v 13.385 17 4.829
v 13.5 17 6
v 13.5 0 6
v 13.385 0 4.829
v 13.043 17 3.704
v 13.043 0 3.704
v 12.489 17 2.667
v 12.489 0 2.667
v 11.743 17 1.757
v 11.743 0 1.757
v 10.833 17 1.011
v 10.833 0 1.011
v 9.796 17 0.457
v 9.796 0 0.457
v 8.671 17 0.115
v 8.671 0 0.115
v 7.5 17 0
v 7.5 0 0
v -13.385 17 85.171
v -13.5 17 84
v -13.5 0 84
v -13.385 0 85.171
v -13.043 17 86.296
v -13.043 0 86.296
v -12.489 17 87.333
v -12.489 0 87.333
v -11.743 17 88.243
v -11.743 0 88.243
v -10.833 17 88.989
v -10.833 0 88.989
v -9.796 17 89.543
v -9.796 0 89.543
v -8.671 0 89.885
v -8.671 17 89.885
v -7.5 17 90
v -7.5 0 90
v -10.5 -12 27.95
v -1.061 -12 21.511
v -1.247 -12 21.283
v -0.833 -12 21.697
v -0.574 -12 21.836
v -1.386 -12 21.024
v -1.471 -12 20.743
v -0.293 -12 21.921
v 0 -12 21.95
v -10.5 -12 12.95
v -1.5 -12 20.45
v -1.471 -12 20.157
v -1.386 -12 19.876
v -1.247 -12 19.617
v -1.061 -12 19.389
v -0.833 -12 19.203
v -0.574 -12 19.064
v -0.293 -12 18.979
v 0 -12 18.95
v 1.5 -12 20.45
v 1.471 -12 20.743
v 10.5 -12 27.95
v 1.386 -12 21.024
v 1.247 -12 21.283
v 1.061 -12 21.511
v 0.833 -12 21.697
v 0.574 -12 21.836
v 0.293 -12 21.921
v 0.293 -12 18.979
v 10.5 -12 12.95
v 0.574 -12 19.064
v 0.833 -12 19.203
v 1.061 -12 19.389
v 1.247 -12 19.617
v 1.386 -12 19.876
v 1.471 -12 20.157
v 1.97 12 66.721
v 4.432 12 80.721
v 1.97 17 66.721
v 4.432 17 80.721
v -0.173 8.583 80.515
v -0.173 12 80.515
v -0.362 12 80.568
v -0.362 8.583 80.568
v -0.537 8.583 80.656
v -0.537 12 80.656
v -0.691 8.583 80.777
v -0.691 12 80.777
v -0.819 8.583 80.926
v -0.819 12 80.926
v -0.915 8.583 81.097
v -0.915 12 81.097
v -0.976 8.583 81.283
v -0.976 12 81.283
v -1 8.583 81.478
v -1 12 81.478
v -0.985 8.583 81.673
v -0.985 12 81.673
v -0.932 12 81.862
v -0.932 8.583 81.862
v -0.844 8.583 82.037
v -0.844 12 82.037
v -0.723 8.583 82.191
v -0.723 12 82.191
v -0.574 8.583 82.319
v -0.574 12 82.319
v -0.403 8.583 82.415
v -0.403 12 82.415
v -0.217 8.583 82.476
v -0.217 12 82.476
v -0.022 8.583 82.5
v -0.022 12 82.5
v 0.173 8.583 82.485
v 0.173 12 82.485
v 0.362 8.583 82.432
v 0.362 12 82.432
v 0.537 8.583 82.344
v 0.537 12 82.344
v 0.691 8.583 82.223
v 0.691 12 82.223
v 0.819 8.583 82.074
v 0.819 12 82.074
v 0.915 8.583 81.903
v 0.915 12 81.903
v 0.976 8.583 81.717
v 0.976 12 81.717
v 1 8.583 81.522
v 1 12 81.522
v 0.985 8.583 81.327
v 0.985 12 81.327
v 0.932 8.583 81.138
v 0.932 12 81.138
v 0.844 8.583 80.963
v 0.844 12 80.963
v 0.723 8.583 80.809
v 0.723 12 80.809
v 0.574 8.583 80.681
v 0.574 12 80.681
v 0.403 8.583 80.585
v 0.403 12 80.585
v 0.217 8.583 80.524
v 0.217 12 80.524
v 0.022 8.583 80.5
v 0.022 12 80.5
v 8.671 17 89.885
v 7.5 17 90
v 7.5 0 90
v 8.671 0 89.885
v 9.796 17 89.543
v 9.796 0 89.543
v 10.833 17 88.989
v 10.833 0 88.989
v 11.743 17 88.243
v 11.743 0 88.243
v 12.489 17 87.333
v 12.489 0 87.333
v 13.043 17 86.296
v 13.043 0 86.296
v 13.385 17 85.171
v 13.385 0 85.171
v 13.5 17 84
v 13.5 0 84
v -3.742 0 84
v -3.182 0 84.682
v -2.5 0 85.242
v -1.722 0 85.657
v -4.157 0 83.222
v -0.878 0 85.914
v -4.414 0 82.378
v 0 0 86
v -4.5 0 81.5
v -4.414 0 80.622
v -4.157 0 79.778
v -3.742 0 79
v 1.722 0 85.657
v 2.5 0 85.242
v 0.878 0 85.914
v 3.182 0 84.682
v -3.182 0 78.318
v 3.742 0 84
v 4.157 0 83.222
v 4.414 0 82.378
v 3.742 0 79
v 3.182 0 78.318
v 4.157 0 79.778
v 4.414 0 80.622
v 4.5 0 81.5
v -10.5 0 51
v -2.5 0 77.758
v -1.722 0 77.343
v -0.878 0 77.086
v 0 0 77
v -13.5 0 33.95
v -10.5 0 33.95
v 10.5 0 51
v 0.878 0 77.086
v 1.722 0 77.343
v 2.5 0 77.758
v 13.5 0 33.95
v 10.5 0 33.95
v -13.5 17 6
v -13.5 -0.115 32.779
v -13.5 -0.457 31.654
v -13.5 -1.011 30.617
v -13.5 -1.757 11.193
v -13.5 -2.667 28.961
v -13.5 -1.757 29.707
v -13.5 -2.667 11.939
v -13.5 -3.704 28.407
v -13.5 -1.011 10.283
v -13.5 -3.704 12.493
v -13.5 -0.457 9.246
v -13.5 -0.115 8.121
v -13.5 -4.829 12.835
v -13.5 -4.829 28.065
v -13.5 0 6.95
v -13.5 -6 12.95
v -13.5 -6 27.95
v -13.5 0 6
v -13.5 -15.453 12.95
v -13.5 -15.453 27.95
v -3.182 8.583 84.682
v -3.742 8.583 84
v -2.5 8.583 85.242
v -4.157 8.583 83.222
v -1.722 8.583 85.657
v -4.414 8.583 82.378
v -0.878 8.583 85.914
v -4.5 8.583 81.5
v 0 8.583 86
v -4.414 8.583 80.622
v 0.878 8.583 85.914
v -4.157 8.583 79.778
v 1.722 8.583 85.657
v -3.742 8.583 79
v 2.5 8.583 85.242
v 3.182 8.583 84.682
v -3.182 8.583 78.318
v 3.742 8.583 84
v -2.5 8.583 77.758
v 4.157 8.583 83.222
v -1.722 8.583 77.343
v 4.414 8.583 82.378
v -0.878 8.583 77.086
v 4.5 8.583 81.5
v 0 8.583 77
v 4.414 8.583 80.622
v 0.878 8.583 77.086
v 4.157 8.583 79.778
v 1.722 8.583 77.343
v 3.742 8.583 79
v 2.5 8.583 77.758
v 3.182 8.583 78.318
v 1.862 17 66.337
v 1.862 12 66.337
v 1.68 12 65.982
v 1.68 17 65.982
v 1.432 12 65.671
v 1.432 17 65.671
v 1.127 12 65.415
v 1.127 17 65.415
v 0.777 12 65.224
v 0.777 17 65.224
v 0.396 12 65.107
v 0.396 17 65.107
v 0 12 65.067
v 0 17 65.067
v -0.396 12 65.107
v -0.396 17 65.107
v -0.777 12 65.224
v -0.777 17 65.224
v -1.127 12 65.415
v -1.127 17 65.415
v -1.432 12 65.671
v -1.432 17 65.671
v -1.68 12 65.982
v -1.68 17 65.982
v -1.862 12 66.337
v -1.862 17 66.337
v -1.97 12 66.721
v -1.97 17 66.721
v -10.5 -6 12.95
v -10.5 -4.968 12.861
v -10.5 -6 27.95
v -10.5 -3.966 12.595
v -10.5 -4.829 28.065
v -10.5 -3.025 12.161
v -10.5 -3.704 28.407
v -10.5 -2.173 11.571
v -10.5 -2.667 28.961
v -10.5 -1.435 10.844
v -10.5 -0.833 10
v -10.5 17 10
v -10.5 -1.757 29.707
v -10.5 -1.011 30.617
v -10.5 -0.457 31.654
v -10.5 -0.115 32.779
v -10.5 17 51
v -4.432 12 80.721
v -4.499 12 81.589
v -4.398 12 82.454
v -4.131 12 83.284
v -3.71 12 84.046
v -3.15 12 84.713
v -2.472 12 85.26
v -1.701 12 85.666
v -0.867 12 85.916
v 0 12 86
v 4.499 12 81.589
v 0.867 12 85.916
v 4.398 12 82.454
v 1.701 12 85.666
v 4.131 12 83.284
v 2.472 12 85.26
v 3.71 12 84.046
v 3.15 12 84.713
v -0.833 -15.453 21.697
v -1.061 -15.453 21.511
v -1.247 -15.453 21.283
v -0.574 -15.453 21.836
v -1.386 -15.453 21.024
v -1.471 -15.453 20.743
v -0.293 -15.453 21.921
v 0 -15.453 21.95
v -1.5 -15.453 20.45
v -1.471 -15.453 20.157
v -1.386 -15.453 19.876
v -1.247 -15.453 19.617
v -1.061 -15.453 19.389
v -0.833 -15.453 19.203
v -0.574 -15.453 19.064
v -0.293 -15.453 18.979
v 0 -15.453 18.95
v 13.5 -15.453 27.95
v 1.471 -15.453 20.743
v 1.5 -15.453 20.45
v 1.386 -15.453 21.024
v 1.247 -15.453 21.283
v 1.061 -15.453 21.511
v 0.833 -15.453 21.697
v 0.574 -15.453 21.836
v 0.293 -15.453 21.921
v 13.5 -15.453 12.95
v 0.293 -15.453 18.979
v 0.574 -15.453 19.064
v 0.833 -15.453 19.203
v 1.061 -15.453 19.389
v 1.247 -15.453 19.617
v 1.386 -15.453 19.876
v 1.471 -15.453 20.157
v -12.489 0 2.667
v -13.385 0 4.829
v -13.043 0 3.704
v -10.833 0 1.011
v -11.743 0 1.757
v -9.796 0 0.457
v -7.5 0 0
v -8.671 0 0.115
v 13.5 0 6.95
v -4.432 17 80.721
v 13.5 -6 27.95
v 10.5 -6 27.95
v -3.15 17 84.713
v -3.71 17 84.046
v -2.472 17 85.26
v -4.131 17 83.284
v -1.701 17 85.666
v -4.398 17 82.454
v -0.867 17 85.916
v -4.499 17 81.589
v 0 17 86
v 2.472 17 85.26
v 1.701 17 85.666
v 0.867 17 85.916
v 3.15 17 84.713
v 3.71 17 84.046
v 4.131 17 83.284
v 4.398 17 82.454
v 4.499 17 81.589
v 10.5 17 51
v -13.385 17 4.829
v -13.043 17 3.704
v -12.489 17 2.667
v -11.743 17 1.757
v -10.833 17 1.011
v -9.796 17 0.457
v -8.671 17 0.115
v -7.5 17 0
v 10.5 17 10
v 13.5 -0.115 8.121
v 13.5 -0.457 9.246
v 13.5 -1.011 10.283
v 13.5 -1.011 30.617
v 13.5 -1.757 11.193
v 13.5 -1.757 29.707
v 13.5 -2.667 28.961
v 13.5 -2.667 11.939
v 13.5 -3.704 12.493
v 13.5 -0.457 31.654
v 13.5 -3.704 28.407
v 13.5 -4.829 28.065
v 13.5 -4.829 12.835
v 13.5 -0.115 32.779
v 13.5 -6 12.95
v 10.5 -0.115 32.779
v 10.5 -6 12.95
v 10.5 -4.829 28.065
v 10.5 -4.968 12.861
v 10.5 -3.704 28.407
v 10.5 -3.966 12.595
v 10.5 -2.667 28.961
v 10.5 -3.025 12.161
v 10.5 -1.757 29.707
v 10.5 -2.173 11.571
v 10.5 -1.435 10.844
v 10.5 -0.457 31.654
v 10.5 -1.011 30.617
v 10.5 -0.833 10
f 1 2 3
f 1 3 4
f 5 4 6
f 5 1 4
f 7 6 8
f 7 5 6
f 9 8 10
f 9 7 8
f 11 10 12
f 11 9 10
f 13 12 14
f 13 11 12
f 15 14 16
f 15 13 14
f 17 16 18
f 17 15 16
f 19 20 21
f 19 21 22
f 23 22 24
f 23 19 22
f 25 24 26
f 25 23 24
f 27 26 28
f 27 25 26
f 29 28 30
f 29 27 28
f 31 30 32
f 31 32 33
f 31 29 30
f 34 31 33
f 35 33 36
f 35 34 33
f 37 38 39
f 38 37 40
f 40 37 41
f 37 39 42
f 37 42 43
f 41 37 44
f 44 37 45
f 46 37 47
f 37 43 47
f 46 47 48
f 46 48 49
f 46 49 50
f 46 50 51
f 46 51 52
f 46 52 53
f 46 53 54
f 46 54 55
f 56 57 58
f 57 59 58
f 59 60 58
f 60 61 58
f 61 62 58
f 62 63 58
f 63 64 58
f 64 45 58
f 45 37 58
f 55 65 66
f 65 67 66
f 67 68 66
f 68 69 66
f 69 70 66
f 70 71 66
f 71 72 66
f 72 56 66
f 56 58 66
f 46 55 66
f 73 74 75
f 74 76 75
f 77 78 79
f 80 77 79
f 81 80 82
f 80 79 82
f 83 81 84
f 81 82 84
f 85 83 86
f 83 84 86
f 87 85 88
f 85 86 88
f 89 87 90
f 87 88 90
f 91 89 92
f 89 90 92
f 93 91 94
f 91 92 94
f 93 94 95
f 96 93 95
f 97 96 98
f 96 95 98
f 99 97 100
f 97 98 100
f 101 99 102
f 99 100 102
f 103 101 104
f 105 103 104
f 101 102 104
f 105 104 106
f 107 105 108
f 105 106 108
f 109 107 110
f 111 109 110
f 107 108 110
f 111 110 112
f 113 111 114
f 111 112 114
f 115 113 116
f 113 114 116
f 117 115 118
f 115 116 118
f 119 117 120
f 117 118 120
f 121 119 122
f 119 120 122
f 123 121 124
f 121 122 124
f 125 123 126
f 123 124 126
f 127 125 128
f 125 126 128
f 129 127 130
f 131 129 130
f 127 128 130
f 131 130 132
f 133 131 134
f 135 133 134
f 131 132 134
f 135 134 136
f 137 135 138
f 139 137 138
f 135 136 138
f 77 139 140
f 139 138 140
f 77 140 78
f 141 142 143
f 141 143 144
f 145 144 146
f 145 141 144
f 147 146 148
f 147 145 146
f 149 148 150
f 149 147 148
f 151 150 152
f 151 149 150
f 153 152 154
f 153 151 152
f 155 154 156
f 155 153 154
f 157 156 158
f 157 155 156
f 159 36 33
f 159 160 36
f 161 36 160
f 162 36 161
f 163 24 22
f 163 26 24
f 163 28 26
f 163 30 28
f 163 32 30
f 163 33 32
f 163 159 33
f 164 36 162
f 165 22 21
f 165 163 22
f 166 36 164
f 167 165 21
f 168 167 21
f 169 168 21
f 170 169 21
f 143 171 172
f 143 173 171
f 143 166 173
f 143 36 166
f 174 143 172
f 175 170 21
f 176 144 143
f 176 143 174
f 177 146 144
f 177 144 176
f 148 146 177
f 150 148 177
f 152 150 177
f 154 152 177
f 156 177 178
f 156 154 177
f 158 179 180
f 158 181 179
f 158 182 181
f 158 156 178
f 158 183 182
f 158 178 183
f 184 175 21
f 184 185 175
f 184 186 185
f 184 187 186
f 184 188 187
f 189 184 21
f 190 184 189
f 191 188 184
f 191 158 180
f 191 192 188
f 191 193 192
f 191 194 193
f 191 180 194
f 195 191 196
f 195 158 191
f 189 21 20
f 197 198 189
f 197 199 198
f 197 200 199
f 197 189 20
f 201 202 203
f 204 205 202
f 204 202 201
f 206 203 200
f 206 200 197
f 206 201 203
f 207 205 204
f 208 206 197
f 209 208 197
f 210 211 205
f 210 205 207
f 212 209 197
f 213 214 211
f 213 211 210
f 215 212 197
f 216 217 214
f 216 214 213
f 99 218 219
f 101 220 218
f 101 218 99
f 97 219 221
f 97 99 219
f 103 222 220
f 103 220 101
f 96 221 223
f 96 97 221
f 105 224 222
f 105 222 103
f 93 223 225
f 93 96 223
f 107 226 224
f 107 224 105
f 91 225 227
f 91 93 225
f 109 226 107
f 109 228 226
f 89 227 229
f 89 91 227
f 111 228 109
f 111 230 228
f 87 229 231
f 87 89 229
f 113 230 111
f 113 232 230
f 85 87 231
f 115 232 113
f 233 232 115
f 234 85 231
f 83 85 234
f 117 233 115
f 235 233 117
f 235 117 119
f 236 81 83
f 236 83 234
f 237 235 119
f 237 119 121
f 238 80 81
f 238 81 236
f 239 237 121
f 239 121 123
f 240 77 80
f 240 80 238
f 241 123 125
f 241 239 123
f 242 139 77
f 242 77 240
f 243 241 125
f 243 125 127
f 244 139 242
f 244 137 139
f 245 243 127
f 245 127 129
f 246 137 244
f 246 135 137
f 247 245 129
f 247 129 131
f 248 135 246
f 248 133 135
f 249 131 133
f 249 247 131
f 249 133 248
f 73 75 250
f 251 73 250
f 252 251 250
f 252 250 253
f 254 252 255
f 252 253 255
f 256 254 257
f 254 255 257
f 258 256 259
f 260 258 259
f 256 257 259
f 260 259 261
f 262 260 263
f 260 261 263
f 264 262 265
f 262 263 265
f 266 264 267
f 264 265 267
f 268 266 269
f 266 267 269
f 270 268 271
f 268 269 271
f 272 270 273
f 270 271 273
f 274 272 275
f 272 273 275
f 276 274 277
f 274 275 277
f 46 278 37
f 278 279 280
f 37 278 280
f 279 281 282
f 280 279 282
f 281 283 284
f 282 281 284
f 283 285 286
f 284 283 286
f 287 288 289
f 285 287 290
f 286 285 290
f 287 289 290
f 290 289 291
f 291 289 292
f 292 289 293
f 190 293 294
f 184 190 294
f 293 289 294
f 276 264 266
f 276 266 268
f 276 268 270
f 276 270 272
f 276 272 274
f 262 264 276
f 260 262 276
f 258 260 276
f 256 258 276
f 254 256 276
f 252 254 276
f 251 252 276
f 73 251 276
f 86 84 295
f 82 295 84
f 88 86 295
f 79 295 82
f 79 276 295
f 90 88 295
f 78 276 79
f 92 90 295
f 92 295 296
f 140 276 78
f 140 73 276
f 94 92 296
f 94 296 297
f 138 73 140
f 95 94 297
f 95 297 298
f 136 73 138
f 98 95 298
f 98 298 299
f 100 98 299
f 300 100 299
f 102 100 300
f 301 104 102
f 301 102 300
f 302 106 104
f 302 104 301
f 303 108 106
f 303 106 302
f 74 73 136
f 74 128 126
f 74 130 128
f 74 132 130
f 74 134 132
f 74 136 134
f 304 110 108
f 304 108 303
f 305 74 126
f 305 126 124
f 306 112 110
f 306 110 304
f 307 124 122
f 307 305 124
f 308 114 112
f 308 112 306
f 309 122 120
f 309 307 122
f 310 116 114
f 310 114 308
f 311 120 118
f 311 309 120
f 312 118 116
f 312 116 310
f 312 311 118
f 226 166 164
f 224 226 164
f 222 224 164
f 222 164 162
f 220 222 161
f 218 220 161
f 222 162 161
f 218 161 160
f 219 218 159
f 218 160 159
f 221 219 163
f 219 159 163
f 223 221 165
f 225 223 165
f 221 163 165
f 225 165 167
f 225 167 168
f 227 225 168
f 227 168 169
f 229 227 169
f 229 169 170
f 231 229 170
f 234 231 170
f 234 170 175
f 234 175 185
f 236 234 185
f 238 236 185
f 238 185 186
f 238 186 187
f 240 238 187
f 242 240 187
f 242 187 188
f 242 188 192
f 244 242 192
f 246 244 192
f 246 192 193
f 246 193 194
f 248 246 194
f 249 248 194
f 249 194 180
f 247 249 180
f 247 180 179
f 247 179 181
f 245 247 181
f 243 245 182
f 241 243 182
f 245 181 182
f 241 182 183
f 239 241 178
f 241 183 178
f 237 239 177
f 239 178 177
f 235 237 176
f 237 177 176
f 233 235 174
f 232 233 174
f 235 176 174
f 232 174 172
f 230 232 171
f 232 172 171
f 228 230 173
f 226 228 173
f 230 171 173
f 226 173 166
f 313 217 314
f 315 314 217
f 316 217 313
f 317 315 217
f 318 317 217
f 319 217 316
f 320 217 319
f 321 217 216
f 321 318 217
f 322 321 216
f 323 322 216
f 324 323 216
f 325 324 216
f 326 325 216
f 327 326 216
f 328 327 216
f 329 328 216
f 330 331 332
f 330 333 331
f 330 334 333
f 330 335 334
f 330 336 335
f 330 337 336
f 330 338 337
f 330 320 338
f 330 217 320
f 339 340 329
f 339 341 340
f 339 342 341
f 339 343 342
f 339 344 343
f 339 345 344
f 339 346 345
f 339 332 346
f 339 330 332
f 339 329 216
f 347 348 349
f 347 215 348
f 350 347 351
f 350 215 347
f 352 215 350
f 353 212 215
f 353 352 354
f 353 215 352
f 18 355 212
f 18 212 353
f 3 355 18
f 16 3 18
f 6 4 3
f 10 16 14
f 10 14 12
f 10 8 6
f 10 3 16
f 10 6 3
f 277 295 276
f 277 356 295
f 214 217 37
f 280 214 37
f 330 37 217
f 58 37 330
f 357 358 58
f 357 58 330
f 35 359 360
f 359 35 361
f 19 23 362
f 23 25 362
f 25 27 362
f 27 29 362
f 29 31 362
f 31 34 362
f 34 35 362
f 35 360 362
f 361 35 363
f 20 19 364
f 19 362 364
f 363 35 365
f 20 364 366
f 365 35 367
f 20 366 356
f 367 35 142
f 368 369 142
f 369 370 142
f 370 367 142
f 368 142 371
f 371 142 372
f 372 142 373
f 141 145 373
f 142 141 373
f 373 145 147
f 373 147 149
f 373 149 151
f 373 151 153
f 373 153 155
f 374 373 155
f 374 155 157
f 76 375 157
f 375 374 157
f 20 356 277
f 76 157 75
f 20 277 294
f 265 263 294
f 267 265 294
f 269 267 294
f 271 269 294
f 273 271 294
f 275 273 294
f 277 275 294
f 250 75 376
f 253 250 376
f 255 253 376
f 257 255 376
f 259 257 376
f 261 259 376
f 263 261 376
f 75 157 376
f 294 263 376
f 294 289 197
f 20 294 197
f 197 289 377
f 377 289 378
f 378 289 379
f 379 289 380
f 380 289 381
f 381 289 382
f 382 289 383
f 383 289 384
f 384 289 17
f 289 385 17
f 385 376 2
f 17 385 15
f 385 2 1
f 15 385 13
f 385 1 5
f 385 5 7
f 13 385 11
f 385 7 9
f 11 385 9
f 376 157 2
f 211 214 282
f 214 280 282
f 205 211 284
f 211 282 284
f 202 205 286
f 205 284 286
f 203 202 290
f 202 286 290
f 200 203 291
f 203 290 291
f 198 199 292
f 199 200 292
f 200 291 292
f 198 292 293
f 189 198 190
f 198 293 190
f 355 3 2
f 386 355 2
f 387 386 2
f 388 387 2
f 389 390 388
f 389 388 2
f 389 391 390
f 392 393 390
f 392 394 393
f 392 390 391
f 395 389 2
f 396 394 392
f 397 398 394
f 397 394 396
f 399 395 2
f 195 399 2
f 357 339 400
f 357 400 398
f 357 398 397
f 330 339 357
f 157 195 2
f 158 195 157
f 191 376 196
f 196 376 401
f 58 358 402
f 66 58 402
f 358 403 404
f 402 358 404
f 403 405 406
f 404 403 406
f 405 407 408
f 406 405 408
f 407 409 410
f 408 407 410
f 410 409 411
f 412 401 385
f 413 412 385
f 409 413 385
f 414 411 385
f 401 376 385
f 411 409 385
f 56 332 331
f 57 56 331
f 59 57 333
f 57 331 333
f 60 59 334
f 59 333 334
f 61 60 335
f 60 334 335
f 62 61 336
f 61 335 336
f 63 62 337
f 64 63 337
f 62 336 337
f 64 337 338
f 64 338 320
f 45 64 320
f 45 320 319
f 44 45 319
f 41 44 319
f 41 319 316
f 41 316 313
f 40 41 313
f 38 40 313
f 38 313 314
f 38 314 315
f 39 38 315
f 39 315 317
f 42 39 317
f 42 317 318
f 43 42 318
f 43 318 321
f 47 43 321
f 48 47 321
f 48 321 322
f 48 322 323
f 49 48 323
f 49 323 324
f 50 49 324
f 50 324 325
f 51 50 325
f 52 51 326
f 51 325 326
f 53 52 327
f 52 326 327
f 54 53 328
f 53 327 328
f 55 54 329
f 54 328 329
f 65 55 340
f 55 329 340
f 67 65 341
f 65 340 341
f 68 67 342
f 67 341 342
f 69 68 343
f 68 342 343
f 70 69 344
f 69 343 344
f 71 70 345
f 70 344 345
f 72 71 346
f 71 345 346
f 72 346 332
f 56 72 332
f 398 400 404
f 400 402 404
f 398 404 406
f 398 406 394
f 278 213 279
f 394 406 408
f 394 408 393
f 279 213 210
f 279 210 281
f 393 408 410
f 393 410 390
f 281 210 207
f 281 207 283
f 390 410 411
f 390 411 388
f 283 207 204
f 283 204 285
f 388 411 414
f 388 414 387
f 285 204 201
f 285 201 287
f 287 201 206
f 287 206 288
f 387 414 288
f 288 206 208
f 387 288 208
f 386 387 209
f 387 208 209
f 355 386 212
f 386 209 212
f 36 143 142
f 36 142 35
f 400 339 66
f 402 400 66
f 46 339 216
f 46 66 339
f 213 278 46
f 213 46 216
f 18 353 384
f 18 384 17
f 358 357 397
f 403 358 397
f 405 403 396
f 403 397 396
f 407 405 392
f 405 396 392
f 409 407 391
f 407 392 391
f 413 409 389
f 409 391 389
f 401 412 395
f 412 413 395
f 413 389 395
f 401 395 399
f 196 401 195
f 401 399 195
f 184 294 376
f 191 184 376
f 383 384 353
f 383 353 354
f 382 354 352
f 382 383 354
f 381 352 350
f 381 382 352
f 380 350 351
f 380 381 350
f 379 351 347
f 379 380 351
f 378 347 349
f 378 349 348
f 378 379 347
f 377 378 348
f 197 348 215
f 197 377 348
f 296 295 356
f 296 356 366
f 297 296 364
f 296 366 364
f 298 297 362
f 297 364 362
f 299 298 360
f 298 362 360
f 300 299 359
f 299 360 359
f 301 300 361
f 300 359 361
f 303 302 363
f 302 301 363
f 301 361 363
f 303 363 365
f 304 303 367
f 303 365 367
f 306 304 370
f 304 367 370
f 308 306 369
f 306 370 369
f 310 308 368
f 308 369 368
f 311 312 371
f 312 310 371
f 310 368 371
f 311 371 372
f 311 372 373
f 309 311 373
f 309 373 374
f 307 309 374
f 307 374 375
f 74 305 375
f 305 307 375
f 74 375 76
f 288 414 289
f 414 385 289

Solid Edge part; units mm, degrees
sketch "Sketch1" plane through (0, 0, 0) normal (0, -1, 0) x (1, 0, 0)
  line L0 (-13.5, 0) -> (13.5, 0)
  line L1 (13.5, 0) -> (13.5, 90)
  line L2 (13.5, 90) -> (-13.5, 90)
  line L3 (-13.5, 90) -> (-13.5, 0)
  dimension "D1" = 27
  dimension "D2" = 90
extrude "Protrusion1" add sketch "Sketch1" against normal blind 17
sketch "Sketch2" plane through (0, 17, 40) normal (0, 1, 0) x (-1, 0, 0)
  line L0 (-10.5, -30) -> (10.5, -30)
  line L1 (10.5, -30) -> (10.5, 11)
  line L2 (10.5, 11) -> (-10.5, 11)
  line L3 (-10.5, 11) -> (-10.5, -30)
  dimension "D1" = 21
  dimension "D2" = 41
  dimension "D3" = 10
extrude "ExtrudedCutout_1" cut sketch "Sketch2" against normal blind 53.489
sketch "Sketch3" plane through (0, 17, 40) normal (0, 1, 0) x (-1, 0, 0)
  line L0 (-4.432, 40.7205) -> (-1.9698, 26.7205)
  arc A0 (-1.9698, 26.7205) -> (1.9698, 26.7205) centre (0, 27.067) ccw
  line L1 (4.432, 40.7205) -> (1.9698, 26.7205)
  arc A1 (-4.432, 40.7205) -> (4.432, 40.7205) centre (0, 41.5) cw
  dimension "D1" = 14
  dimension "D2" = 2
  dimension "D3" = 4
extrude "ExtrudedCutout_2" cut sketch "Sketch3" against normal blind 5
fillet "Round_1" radius 6 4 edges at (-13.5, 8.5, 0) (13.5, 8.5, 0) (13.5, 8.5, 90) (-13.5, 8.5, 90)
sketch "Sketch4" plane through (0, 12, 75.5335) normal (0, 1, 0) x (-0.1732, 0, -0.9849)
  circle A0 centre (-5.8763, 1.0335) radius 1
extrude "Cutout1" cut sketch "Sketch4" against normal through all
sketch "Sketch5" plane through (0, 0, 45) normal (0, -1, 0) x (0, 0, 1)
  circle A0 centre (36.5, 0) radius 4.5
extrude "ExtrudedCutout_4" cut sketch "Sketch5" against normal blind 8.5833
sketch "Sketch6" plane through (0, 0, 45) normal (0, -1, 0) x (0, 0, -1)
  line L0 (17.05, 13.5) -> (32.05, 13.5)
  line L1 (32.05, 13.5) -> (32.05, 10.5)
  line L2 (32.05, 10.5) -> (17.05, 10.5)
  line L3 (17.05, 10.5) -> (17.05, 13.5)
  line L4 (17.05, -10.5) -> (32.05, -10.5)
  line L5 (32.05, -10.5) -> (32.05, -13.5)
  line L6 (32.05, -13.5) -> (17.05, -13.5)
  line L7 (17.05, -13.5) -> (17.05, -10.5)
  dimension "D1" = 10.45
  dimension "D2" = 15
extrude "ExtrudedProtrusion_3" add sketch "Sketch6" along normal blind 12
sketch "Sketch7" plane through (-12, -12, 20.45) normal (0, -1, 0) x (0, 0, -1)
  line L0 (-7.5, -1.5) -> (7.5, -1.5)
  line L1 (7.5, -1.5) -> (7.5, 25.5)
  line L2 (7.5, 25.5) -> (-7.5, 25.5)
  line L3 (-7.5, 25.5) -> (-7.5, -1.5)
extrude "ExtrudedProtrusion_4" add sketch "Sketch7" along normal blind 3.4534
sketch "Sketch8" plane through (0, -15.4534, 20.45) normal (0, -1, 0) x (1, 0, 0)
  circle A0 centre (0, 0) radius 1.5
extrude "ExtrudedCutout_5" cut sketch "Sketch8" against normal blind 4.5945
fillet "Round_2" radius 6 3 edges at (-12, 0, 27.95) (12, 0, 27.95) (-12, 0, 12.95)
